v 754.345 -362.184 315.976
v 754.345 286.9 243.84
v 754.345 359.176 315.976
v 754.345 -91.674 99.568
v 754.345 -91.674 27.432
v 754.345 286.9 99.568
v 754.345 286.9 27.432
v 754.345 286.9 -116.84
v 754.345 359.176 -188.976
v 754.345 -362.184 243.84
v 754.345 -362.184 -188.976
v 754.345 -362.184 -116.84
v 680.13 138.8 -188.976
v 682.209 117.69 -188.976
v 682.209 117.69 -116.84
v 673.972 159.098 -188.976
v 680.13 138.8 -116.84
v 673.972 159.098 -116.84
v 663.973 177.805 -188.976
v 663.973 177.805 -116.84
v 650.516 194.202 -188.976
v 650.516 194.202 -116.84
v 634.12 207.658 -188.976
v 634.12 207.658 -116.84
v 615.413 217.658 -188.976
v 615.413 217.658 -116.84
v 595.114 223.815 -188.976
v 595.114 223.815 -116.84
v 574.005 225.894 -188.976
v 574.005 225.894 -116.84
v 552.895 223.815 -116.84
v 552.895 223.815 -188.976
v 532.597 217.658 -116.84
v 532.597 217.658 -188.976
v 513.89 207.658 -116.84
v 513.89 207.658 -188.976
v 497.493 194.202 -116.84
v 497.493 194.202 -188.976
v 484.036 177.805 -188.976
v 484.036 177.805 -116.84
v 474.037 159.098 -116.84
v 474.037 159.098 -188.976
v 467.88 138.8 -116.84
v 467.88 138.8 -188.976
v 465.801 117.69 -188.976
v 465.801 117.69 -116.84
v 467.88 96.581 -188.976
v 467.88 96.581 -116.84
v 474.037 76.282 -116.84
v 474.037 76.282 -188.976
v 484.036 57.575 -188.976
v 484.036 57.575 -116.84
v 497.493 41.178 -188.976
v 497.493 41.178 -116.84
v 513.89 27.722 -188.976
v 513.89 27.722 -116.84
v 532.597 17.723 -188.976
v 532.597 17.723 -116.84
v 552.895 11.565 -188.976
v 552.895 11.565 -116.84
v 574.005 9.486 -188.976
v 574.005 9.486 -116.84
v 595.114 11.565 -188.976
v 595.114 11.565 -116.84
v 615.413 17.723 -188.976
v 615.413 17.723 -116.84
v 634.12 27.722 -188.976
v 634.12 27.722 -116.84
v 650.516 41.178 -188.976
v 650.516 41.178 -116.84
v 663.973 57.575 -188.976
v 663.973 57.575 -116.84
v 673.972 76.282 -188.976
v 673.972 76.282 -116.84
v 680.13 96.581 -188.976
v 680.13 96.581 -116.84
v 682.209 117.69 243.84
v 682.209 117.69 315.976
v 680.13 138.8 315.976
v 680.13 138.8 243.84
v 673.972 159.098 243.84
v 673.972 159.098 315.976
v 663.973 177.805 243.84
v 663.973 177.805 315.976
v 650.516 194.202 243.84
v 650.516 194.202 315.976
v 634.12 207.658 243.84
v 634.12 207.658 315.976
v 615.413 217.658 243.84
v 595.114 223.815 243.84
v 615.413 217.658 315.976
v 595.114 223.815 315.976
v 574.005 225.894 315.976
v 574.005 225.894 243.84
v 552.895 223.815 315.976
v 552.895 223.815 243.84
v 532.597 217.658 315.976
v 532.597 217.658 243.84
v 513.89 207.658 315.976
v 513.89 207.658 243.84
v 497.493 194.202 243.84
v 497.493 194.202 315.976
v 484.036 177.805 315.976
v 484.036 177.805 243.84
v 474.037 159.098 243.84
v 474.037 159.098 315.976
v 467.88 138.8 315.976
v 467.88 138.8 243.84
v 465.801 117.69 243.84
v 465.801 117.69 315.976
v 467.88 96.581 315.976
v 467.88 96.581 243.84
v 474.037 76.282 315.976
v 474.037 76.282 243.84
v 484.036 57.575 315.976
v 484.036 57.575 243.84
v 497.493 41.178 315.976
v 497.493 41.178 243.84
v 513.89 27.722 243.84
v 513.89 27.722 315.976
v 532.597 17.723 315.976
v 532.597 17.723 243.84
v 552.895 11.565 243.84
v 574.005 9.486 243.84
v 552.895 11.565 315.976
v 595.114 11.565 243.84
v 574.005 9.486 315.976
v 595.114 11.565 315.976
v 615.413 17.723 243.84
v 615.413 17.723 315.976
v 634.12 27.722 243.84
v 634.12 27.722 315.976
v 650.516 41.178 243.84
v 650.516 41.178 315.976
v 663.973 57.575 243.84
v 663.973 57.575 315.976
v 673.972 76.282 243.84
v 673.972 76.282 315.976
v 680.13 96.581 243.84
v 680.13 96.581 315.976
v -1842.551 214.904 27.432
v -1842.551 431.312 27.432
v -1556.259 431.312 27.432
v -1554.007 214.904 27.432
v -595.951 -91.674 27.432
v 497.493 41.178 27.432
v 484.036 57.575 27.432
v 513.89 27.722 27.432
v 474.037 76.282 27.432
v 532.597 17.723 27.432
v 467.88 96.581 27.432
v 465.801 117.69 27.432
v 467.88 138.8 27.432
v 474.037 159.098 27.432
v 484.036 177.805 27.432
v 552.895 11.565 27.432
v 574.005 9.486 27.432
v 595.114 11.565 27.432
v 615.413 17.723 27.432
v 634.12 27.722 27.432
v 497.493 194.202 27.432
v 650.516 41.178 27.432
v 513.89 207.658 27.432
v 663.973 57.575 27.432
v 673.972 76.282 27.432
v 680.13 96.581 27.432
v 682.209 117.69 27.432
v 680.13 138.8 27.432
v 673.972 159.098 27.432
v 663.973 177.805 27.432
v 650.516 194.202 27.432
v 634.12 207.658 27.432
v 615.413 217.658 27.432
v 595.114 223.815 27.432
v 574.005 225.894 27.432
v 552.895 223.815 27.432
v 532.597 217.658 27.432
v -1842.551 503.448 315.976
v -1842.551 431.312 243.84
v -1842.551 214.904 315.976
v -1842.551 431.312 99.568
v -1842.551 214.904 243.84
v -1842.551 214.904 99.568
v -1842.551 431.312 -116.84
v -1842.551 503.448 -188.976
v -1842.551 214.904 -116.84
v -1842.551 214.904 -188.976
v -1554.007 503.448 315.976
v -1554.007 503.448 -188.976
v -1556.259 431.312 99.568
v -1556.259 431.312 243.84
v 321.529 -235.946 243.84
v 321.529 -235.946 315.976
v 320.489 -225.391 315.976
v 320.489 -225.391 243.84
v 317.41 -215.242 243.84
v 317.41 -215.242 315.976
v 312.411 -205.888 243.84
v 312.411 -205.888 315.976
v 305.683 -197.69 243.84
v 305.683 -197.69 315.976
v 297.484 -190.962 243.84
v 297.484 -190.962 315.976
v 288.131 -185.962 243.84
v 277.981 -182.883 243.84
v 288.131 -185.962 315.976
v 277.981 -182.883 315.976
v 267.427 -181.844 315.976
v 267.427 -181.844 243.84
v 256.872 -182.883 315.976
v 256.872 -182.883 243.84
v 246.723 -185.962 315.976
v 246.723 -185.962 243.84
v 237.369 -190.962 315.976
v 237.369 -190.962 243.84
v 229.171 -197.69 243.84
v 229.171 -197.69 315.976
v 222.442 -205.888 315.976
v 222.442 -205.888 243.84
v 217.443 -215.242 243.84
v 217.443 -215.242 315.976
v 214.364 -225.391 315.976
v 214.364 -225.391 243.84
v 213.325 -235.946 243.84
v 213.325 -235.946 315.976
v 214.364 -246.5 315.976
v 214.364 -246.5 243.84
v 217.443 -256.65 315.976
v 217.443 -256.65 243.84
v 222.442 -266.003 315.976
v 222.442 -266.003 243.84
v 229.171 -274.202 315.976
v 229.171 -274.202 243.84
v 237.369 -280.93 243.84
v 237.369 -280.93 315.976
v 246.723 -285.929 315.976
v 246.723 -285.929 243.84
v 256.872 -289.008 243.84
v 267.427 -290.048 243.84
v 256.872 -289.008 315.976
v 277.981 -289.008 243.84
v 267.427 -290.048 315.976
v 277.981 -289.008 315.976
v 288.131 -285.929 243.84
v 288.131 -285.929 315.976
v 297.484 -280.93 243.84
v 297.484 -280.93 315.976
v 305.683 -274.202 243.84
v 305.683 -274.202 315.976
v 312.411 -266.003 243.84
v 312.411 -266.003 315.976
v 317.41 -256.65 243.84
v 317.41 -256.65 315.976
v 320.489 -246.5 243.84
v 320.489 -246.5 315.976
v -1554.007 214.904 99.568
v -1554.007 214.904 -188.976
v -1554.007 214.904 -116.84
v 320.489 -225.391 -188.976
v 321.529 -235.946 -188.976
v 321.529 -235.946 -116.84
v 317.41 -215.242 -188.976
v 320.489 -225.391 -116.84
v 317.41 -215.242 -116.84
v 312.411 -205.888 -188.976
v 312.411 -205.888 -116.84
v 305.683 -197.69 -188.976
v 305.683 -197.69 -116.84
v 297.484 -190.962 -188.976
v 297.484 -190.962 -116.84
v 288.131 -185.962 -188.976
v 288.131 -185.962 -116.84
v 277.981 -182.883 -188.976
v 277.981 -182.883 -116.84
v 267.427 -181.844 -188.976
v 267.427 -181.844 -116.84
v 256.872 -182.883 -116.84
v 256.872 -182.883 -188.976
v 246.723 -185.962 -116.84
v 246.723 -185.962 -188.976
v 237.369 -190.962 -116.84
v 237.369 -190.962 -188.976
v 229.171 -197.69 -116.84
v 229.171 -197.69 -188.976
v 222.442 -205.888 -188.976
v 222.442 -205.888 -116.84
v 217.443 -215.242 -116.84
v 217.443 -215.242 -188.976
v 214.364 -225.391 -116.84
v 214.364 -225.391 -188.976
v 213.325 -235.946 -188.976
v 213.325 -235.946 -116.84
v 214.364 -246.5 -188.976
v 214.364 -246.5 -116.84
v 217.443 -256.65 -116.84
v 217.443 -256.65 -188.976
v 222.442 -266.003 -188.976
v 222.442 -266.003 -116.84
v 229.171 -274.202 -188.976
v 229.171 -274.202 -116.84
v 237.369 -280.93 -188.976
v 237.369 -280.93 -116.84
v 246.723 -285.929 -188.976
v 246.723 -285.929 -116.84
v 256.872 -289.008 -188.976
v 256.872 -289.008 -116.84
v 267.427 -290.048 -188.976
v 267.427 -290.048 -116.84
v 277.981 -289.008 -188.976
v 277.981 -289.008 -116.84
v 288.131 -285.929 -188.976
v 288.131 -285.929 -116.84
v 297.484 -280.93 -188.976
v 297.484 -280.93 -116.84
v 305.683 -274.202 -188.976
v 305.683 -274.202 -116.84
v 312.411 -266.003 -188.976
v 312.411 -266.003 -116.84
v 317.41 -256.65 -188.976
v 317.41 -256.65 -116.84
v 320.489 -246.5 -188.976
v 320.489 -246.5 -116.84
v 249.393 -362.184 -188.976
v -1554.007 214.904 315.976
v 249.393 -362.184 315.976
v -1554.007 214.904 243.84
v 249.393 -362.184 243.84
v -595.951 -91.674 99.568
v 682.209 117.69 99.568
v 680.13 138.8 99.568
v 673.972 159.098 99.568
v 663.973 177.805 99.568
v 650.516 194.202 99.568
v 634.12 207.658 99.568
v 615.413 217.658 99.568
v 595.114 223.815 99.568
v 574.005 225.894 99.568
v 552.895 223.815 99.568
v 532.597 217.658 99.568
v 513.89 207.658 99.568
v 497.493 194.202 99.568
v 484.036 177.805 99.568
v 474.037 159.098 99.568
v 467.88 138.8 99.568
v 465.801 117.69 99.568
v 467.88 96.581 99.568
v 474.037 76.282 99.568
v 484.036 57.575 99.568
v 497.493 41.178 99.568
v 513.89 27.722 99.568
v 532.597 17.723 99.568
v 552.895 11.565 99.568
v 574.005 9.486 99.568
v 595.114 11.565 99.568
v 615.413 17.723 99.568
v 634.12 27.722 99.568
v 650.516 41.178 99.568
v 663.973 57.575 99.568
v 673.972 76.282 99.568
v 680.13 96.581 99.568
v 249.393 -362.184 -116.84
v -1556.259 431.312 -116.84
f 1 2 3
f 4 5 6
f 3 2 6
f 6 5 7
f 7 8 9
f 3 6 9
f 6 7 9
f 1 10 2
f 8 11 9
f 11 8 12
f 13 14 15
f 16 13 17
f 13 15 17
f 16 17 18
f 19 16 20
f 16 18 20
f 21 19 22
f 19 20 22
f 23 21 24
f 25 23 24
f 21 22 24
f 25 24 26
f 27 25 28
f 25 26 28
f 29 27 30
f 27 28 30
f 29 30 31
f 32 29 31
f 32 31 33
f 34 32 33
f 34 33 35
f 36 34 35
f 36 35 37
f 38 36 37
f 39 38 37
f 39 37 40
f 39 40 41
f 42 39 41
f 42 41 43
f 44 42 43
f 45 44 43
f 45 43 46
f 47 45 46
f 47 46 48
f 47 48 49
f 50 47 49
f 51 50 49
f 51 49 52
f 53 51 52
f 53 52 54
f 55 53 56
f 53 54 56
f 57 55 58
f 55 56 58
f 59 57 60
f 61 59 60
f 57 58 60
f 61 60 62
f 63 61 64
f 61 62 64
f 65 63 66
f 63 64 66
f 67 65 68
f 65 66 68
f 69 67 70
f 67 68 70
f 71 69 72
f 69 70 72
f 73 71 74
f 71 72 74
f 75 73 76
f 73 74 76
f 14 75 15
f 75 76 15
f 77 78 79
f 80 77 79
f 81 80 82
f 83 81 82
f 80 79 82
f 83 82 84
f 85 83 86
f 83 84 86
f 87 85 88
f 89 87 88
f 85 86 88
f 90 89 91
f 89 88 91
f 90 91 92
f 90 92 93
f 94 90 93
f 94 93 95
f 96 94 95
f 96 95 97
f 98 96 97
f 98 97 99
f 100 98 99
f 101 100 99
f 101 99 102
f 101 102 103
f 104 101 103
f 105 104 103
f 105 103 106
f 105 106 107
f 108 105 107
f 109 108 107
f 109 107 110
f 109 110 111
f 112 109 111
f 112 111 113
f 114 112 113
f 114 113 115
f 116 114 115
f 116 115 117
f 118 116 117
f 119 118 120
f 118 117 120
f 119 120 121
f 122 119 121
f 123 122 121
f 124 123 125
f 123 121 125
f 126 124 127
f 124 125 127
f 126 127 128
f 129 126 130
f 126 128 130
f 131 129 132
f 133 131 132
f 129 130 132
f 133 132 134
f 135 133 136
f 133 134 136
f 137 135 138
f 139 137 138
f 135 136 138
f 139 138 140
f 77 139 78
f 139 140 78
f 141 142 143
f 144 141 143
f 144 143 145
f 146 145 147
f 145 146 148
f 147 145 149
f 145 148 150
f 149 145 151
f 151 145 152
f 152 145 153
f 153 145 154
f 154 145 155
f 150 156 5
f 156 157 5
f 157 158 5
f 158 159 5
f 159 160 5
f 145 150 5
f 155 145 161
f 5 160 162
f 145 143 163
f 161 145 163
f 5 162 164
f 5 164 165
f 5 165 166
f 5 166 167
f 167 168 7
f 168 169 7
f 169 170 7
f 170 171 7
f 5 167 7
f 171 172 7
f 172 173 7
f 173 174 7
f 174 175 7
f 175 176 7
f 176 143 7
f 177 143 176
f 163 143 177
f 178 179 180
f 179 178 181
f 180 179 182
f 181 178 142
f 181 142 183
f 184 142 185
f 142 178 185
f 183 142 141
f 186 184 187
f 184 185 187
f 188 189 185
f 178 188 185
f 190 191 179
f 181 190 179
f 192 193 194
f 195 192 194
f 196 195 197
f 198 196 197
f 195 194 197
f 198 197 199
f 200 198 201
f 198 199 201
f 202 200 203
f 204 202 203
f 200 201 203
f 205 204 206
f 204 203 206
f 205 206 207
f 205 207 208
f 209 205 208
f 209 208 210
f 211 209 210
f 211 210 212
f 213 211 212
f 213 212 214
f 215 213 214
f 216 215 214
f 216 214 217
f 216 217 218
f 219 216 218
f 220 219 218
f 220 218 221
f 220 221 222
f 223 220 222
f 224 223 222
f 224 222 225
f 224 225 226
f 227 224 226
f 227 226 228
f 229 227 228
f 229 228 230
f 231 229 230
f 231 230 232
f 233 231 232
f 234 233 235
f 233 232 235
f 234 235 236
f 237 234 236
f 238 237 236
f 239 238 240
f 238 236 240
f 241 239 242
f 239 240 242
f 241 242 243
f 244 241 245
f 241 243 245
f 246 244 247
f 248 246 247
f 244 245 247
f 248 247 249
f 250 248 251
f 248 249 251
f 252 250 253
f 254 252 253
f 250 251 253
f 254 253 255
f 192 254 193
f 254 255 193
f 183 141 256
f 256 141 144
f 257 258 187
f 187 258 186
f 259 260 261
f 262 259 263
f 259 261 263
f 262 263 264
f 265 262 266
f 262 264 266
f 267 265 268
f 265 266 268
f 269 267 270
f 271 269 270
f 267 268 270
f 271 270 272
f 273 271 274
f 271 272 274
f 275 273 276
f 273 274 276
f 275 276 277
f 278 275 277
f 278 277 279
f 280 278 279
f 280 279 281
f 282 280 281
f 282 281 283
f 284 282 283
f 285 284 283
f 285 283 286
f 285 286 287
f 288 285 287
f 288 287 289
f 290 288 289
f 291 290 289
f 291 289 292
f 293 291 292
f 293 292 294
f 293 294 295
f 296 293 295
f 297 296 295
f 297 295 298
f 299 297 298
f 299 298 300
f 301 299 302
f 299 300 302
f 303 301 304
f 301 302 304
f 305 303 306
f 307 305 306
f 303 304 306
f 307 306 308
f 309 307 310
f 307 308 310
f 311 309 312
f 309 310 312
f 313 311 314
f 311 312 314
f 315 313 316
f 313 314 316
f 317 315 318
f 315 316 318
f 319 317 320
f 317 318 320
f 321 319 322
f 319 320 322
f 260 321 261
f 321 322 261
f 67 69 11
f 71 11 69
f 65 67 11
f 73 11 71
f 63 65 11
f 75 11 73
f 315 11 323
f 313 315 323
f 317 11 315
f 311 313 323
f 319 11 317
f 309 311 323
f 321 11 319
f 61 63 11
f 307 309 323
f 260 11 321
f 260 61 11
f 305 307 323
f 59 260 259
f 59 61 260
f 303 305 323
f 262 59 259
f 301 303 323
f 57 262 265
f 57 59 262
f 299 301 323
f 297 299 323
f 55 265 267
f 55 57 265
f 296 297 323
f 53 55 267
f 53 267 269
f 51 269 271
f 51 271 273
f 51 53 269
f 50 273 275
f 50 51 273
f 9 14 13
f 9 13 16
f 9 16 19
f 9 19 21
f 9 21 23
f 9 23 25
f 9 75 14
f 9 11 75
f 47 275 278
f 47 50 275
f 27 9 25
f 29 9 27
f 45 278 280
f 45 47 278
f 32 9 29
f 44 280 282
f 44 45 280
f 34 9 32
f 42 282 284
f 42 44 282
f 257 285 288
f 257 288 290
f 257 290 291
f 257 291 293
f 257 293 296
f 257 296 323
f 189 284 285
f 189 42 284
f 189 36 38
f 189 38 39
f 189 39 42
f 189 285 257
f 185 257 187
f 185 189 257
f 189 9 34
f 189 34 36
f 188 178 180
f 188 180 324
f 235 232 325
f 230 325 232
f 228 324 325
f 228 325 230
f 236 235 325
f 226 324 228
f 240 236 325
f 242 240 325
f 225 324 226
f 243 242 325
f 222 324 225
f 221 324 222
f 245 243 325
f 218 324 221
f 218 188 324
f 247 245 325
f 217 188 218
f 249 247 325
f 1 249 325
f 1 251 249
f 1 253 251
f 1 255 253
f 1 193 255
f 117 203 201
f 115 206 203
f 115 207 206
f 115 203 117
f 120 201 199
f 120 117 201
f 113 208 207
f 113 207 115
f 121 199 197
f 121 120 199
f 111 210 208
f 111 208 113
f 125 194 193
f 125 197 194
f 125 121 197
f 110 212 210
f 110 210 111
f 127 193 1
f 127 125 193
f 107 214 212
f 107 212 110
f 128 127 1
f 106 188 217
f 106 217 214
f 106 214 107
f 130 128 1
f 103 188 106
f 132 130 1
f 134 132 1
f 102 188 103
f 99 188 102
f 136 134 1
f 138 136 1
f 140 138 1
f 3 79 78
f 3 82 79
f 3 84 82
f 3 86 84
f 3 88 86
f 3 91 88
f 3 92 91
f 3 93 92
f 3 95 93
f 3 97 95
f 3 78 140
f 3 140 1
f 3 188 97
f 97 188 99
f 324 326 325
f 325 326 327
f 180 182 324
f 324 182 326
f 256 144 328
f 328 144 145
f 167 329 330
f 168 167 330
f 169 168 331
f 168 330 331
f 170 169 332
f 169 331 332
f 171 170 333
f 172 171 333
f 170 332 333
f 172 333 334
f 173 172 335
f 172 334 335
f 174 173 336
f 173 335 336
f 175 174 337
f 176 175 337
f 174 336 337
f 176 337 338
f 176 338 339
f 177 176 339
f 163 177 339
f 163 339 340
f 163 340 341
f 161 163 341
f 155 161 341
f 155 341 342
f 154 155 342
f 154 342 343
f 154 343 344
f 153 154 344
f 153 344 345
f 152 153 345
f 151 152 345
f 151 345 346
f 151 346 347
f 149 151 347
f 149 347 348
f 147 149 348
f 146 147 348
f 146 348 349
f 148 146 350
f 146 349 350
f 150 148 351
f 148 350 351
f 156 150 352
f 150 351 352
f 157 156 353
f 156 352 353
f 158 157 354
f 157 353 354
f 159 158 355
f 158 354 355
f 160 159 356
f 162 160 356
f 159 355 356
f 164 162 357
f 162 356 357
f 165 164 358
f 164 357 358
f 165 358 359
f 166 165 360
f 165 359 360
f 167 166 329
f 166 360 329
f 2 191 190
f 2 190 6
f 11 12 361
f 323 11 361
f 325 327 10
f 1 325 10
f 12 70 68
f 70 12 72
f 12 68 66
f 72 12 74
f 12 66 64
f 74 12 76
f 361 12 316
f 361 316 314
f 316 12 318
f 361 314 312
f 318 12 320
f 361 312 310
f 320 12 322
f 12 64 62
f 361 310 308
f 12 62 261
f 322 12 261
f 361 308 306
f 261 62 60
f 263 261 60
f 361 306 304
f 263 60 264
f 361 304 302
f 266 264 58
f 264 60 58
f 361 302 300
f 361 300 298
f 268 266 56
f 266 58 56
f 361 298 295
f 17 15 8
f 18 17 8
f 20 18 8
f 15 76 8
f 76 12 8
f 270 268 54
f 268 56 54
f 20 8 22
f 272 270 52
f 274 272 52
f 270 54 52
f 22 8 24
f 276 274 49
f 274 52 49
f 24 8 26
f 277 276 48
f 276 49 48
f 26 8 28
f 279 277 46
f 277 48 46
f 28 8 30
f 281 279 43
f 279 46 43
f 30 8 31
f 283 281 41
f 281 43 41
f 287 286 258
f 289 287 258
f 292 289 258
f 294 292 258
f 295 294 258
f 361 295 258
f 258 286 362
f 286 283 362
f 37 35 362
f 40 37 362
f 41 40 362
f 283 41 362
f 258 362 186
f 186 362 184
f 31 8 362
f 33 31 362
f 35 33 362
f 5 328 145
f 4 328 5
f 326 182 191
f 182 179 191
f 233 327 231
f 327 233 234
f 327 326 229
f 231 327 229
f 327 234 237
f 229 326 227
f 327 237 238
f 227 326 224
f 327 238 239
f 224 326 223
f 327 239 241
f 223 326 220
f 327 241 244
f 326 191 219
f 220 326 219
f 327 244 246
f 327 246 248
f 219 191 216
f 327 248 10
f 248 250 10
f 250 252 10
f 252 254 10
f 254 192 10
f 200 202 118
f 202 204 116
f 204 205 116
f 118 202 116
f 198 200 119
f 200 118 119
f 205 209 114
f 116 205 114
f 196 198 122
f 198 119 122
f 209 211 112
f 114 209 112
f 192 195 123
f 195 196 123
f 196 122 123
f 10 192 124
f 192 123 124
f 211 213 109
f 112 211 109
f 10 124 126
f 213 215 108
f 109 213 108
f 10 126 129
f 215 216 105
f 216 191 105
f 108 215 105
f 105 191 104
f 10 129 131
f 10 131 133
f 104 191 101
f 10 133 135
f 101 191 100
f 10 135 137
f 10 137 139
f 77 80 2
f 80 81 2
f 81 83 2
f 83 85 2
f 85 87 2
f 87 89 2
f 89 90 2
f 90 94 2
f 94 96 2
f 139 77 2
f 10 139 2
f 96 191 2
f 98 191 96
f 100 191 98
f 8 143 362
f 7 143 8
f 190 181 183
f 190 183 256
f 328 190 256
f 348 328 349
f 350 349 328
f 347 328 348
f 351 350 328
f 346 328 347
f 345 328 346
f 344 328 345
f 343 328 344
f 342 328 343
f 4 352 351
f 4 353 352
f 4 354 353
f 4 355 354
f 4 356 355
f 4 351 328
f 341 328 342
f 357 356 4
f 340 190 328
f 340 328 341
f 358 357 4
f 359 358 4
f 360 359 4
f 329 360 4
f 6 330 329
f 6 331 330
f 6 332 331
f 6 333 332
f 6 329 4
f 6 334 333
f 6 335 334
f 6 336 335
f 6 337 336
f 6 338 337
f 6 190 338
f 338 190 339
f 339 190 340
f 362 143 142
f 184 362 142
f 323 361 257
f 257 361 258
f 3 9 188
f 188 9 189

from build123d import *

# Parameters (mm, degrees)
BOSS_EXTRUDE1_DEPTH      = 25.4
BOSS_EXTRUDE2_DEPTH      = 25.4
BOSS_EXTRUDE3_DEPTH      = 152.4
BOSS_EXTRUDE4_DEPTH      = 12.7
BOSS_EXTRUDE4_DEPTH_BACK = 12.7
SKETCH5_R                = 38.1
SKETCH5_R_2              = 19.05
CUT_EXTRUDE1_DEPTH       = 981.124094184
CUT_EXTRUDE2_DEPTH       = 25.4
SCALE1_SCALE             = 2.84


with BuildPart() as part:
    # Sketch1 → Boss-Extrude1 (new body)
    with BuildSketch(Plane.XY):
        Polygon((-914.4, 304.8), (-812.8, 304.8), (0, 254), (0, 0), (-177.8, 0), (-812.8, 203.2), (-914.4, 203.2), align=None)
    extrude(amount=-BOSS_EXTRUDE1_DEPTH)



with BuildPart() as body_2:
    # Sketch2 → Boss-Extrude2 (new body)
    with BuildSketch(Plane.XY.offset(127)):
        Polygon((-812.8, 203.2), (-177.8, 0), (0, 0), (0, 254), (-812.8, 304.8), (-914.4, 304.8), (-914.4, 203.2), align=None)
    extrude(amount=BOSS_EXTRUDE2_DEPTH)


with BuildPart() as part_1:
    add(part.part)

    add(body_2.part)  # Boss-Extrude3 merges body 2
    # Sketch3 → Boss-Extrude3 (add)
    with BuildSketch(Plane.XY.offset(152.4)):
        Polygon((-914.4, 279.4), (-914.4, 304.8), (-812.8, 304.8), (0, 254), (0, 228.550438977), (-25.4, 230.137938977), (-813.592976364, 279.4), align=None)
    extrude(amount=-BOSS_EXTRUDE3_DEPTH)

    # Sketch6 → Boss-Extrude4 (add, two sides: drawn at the far end of the back side and taken through both)
    with BuildSketch(Plane.XY.offset(63.5).offset(-BOSS_EXTRUDE4_DEPTH_BACK)):
        Polygon((-812.8, 203.2), (-177.8, 0), (0, 0), (0, 254), (-812.8, 304.8), (-914.4, 304.8), (-914.4, 203.2), align=None)
    extrude(amount=BOSS_EXTRUDE4_DEPTH + BOSS_EXTRUDE4_DEPTH_BACK)

    # Sketch5 → Cut-Extrude1 (cut, through all)
    with BuildSketch(Plane.XY.offset(152.4)):
        with Locations((-63.5, 168.969627955)):
            Circle(SKETCH5_R)
        with Locations((-171.45, 44.45)):
            Circle(SKETCH5_R_2)
    extrude(amount=-CUT_EXTRUDE1_DEPTH, mode=Mode.SUBTRACT)

    # Sketch7 → Cut-Extrude2 (cut)
    with BuildSketch(Plane.XY.offset(76.2)):
        Polygon((-475.45625, 95.25), (0, 95.25), (0, 0), (-177.8, 0), align=None)
    extrude(amount=-CUT_EXTRUDE2_DEPTH, mode=Mode.SUBTRACT)


with BuildPart() as part_2:
    # Scale1: scaled about (-409.969923115, 196.838960964, 63.5)
    add(part_1.part.scale(SCALE1_SCALE).moved(Location((754.344658532, -362.183688174, -116.84))))


solid = part_2.part
